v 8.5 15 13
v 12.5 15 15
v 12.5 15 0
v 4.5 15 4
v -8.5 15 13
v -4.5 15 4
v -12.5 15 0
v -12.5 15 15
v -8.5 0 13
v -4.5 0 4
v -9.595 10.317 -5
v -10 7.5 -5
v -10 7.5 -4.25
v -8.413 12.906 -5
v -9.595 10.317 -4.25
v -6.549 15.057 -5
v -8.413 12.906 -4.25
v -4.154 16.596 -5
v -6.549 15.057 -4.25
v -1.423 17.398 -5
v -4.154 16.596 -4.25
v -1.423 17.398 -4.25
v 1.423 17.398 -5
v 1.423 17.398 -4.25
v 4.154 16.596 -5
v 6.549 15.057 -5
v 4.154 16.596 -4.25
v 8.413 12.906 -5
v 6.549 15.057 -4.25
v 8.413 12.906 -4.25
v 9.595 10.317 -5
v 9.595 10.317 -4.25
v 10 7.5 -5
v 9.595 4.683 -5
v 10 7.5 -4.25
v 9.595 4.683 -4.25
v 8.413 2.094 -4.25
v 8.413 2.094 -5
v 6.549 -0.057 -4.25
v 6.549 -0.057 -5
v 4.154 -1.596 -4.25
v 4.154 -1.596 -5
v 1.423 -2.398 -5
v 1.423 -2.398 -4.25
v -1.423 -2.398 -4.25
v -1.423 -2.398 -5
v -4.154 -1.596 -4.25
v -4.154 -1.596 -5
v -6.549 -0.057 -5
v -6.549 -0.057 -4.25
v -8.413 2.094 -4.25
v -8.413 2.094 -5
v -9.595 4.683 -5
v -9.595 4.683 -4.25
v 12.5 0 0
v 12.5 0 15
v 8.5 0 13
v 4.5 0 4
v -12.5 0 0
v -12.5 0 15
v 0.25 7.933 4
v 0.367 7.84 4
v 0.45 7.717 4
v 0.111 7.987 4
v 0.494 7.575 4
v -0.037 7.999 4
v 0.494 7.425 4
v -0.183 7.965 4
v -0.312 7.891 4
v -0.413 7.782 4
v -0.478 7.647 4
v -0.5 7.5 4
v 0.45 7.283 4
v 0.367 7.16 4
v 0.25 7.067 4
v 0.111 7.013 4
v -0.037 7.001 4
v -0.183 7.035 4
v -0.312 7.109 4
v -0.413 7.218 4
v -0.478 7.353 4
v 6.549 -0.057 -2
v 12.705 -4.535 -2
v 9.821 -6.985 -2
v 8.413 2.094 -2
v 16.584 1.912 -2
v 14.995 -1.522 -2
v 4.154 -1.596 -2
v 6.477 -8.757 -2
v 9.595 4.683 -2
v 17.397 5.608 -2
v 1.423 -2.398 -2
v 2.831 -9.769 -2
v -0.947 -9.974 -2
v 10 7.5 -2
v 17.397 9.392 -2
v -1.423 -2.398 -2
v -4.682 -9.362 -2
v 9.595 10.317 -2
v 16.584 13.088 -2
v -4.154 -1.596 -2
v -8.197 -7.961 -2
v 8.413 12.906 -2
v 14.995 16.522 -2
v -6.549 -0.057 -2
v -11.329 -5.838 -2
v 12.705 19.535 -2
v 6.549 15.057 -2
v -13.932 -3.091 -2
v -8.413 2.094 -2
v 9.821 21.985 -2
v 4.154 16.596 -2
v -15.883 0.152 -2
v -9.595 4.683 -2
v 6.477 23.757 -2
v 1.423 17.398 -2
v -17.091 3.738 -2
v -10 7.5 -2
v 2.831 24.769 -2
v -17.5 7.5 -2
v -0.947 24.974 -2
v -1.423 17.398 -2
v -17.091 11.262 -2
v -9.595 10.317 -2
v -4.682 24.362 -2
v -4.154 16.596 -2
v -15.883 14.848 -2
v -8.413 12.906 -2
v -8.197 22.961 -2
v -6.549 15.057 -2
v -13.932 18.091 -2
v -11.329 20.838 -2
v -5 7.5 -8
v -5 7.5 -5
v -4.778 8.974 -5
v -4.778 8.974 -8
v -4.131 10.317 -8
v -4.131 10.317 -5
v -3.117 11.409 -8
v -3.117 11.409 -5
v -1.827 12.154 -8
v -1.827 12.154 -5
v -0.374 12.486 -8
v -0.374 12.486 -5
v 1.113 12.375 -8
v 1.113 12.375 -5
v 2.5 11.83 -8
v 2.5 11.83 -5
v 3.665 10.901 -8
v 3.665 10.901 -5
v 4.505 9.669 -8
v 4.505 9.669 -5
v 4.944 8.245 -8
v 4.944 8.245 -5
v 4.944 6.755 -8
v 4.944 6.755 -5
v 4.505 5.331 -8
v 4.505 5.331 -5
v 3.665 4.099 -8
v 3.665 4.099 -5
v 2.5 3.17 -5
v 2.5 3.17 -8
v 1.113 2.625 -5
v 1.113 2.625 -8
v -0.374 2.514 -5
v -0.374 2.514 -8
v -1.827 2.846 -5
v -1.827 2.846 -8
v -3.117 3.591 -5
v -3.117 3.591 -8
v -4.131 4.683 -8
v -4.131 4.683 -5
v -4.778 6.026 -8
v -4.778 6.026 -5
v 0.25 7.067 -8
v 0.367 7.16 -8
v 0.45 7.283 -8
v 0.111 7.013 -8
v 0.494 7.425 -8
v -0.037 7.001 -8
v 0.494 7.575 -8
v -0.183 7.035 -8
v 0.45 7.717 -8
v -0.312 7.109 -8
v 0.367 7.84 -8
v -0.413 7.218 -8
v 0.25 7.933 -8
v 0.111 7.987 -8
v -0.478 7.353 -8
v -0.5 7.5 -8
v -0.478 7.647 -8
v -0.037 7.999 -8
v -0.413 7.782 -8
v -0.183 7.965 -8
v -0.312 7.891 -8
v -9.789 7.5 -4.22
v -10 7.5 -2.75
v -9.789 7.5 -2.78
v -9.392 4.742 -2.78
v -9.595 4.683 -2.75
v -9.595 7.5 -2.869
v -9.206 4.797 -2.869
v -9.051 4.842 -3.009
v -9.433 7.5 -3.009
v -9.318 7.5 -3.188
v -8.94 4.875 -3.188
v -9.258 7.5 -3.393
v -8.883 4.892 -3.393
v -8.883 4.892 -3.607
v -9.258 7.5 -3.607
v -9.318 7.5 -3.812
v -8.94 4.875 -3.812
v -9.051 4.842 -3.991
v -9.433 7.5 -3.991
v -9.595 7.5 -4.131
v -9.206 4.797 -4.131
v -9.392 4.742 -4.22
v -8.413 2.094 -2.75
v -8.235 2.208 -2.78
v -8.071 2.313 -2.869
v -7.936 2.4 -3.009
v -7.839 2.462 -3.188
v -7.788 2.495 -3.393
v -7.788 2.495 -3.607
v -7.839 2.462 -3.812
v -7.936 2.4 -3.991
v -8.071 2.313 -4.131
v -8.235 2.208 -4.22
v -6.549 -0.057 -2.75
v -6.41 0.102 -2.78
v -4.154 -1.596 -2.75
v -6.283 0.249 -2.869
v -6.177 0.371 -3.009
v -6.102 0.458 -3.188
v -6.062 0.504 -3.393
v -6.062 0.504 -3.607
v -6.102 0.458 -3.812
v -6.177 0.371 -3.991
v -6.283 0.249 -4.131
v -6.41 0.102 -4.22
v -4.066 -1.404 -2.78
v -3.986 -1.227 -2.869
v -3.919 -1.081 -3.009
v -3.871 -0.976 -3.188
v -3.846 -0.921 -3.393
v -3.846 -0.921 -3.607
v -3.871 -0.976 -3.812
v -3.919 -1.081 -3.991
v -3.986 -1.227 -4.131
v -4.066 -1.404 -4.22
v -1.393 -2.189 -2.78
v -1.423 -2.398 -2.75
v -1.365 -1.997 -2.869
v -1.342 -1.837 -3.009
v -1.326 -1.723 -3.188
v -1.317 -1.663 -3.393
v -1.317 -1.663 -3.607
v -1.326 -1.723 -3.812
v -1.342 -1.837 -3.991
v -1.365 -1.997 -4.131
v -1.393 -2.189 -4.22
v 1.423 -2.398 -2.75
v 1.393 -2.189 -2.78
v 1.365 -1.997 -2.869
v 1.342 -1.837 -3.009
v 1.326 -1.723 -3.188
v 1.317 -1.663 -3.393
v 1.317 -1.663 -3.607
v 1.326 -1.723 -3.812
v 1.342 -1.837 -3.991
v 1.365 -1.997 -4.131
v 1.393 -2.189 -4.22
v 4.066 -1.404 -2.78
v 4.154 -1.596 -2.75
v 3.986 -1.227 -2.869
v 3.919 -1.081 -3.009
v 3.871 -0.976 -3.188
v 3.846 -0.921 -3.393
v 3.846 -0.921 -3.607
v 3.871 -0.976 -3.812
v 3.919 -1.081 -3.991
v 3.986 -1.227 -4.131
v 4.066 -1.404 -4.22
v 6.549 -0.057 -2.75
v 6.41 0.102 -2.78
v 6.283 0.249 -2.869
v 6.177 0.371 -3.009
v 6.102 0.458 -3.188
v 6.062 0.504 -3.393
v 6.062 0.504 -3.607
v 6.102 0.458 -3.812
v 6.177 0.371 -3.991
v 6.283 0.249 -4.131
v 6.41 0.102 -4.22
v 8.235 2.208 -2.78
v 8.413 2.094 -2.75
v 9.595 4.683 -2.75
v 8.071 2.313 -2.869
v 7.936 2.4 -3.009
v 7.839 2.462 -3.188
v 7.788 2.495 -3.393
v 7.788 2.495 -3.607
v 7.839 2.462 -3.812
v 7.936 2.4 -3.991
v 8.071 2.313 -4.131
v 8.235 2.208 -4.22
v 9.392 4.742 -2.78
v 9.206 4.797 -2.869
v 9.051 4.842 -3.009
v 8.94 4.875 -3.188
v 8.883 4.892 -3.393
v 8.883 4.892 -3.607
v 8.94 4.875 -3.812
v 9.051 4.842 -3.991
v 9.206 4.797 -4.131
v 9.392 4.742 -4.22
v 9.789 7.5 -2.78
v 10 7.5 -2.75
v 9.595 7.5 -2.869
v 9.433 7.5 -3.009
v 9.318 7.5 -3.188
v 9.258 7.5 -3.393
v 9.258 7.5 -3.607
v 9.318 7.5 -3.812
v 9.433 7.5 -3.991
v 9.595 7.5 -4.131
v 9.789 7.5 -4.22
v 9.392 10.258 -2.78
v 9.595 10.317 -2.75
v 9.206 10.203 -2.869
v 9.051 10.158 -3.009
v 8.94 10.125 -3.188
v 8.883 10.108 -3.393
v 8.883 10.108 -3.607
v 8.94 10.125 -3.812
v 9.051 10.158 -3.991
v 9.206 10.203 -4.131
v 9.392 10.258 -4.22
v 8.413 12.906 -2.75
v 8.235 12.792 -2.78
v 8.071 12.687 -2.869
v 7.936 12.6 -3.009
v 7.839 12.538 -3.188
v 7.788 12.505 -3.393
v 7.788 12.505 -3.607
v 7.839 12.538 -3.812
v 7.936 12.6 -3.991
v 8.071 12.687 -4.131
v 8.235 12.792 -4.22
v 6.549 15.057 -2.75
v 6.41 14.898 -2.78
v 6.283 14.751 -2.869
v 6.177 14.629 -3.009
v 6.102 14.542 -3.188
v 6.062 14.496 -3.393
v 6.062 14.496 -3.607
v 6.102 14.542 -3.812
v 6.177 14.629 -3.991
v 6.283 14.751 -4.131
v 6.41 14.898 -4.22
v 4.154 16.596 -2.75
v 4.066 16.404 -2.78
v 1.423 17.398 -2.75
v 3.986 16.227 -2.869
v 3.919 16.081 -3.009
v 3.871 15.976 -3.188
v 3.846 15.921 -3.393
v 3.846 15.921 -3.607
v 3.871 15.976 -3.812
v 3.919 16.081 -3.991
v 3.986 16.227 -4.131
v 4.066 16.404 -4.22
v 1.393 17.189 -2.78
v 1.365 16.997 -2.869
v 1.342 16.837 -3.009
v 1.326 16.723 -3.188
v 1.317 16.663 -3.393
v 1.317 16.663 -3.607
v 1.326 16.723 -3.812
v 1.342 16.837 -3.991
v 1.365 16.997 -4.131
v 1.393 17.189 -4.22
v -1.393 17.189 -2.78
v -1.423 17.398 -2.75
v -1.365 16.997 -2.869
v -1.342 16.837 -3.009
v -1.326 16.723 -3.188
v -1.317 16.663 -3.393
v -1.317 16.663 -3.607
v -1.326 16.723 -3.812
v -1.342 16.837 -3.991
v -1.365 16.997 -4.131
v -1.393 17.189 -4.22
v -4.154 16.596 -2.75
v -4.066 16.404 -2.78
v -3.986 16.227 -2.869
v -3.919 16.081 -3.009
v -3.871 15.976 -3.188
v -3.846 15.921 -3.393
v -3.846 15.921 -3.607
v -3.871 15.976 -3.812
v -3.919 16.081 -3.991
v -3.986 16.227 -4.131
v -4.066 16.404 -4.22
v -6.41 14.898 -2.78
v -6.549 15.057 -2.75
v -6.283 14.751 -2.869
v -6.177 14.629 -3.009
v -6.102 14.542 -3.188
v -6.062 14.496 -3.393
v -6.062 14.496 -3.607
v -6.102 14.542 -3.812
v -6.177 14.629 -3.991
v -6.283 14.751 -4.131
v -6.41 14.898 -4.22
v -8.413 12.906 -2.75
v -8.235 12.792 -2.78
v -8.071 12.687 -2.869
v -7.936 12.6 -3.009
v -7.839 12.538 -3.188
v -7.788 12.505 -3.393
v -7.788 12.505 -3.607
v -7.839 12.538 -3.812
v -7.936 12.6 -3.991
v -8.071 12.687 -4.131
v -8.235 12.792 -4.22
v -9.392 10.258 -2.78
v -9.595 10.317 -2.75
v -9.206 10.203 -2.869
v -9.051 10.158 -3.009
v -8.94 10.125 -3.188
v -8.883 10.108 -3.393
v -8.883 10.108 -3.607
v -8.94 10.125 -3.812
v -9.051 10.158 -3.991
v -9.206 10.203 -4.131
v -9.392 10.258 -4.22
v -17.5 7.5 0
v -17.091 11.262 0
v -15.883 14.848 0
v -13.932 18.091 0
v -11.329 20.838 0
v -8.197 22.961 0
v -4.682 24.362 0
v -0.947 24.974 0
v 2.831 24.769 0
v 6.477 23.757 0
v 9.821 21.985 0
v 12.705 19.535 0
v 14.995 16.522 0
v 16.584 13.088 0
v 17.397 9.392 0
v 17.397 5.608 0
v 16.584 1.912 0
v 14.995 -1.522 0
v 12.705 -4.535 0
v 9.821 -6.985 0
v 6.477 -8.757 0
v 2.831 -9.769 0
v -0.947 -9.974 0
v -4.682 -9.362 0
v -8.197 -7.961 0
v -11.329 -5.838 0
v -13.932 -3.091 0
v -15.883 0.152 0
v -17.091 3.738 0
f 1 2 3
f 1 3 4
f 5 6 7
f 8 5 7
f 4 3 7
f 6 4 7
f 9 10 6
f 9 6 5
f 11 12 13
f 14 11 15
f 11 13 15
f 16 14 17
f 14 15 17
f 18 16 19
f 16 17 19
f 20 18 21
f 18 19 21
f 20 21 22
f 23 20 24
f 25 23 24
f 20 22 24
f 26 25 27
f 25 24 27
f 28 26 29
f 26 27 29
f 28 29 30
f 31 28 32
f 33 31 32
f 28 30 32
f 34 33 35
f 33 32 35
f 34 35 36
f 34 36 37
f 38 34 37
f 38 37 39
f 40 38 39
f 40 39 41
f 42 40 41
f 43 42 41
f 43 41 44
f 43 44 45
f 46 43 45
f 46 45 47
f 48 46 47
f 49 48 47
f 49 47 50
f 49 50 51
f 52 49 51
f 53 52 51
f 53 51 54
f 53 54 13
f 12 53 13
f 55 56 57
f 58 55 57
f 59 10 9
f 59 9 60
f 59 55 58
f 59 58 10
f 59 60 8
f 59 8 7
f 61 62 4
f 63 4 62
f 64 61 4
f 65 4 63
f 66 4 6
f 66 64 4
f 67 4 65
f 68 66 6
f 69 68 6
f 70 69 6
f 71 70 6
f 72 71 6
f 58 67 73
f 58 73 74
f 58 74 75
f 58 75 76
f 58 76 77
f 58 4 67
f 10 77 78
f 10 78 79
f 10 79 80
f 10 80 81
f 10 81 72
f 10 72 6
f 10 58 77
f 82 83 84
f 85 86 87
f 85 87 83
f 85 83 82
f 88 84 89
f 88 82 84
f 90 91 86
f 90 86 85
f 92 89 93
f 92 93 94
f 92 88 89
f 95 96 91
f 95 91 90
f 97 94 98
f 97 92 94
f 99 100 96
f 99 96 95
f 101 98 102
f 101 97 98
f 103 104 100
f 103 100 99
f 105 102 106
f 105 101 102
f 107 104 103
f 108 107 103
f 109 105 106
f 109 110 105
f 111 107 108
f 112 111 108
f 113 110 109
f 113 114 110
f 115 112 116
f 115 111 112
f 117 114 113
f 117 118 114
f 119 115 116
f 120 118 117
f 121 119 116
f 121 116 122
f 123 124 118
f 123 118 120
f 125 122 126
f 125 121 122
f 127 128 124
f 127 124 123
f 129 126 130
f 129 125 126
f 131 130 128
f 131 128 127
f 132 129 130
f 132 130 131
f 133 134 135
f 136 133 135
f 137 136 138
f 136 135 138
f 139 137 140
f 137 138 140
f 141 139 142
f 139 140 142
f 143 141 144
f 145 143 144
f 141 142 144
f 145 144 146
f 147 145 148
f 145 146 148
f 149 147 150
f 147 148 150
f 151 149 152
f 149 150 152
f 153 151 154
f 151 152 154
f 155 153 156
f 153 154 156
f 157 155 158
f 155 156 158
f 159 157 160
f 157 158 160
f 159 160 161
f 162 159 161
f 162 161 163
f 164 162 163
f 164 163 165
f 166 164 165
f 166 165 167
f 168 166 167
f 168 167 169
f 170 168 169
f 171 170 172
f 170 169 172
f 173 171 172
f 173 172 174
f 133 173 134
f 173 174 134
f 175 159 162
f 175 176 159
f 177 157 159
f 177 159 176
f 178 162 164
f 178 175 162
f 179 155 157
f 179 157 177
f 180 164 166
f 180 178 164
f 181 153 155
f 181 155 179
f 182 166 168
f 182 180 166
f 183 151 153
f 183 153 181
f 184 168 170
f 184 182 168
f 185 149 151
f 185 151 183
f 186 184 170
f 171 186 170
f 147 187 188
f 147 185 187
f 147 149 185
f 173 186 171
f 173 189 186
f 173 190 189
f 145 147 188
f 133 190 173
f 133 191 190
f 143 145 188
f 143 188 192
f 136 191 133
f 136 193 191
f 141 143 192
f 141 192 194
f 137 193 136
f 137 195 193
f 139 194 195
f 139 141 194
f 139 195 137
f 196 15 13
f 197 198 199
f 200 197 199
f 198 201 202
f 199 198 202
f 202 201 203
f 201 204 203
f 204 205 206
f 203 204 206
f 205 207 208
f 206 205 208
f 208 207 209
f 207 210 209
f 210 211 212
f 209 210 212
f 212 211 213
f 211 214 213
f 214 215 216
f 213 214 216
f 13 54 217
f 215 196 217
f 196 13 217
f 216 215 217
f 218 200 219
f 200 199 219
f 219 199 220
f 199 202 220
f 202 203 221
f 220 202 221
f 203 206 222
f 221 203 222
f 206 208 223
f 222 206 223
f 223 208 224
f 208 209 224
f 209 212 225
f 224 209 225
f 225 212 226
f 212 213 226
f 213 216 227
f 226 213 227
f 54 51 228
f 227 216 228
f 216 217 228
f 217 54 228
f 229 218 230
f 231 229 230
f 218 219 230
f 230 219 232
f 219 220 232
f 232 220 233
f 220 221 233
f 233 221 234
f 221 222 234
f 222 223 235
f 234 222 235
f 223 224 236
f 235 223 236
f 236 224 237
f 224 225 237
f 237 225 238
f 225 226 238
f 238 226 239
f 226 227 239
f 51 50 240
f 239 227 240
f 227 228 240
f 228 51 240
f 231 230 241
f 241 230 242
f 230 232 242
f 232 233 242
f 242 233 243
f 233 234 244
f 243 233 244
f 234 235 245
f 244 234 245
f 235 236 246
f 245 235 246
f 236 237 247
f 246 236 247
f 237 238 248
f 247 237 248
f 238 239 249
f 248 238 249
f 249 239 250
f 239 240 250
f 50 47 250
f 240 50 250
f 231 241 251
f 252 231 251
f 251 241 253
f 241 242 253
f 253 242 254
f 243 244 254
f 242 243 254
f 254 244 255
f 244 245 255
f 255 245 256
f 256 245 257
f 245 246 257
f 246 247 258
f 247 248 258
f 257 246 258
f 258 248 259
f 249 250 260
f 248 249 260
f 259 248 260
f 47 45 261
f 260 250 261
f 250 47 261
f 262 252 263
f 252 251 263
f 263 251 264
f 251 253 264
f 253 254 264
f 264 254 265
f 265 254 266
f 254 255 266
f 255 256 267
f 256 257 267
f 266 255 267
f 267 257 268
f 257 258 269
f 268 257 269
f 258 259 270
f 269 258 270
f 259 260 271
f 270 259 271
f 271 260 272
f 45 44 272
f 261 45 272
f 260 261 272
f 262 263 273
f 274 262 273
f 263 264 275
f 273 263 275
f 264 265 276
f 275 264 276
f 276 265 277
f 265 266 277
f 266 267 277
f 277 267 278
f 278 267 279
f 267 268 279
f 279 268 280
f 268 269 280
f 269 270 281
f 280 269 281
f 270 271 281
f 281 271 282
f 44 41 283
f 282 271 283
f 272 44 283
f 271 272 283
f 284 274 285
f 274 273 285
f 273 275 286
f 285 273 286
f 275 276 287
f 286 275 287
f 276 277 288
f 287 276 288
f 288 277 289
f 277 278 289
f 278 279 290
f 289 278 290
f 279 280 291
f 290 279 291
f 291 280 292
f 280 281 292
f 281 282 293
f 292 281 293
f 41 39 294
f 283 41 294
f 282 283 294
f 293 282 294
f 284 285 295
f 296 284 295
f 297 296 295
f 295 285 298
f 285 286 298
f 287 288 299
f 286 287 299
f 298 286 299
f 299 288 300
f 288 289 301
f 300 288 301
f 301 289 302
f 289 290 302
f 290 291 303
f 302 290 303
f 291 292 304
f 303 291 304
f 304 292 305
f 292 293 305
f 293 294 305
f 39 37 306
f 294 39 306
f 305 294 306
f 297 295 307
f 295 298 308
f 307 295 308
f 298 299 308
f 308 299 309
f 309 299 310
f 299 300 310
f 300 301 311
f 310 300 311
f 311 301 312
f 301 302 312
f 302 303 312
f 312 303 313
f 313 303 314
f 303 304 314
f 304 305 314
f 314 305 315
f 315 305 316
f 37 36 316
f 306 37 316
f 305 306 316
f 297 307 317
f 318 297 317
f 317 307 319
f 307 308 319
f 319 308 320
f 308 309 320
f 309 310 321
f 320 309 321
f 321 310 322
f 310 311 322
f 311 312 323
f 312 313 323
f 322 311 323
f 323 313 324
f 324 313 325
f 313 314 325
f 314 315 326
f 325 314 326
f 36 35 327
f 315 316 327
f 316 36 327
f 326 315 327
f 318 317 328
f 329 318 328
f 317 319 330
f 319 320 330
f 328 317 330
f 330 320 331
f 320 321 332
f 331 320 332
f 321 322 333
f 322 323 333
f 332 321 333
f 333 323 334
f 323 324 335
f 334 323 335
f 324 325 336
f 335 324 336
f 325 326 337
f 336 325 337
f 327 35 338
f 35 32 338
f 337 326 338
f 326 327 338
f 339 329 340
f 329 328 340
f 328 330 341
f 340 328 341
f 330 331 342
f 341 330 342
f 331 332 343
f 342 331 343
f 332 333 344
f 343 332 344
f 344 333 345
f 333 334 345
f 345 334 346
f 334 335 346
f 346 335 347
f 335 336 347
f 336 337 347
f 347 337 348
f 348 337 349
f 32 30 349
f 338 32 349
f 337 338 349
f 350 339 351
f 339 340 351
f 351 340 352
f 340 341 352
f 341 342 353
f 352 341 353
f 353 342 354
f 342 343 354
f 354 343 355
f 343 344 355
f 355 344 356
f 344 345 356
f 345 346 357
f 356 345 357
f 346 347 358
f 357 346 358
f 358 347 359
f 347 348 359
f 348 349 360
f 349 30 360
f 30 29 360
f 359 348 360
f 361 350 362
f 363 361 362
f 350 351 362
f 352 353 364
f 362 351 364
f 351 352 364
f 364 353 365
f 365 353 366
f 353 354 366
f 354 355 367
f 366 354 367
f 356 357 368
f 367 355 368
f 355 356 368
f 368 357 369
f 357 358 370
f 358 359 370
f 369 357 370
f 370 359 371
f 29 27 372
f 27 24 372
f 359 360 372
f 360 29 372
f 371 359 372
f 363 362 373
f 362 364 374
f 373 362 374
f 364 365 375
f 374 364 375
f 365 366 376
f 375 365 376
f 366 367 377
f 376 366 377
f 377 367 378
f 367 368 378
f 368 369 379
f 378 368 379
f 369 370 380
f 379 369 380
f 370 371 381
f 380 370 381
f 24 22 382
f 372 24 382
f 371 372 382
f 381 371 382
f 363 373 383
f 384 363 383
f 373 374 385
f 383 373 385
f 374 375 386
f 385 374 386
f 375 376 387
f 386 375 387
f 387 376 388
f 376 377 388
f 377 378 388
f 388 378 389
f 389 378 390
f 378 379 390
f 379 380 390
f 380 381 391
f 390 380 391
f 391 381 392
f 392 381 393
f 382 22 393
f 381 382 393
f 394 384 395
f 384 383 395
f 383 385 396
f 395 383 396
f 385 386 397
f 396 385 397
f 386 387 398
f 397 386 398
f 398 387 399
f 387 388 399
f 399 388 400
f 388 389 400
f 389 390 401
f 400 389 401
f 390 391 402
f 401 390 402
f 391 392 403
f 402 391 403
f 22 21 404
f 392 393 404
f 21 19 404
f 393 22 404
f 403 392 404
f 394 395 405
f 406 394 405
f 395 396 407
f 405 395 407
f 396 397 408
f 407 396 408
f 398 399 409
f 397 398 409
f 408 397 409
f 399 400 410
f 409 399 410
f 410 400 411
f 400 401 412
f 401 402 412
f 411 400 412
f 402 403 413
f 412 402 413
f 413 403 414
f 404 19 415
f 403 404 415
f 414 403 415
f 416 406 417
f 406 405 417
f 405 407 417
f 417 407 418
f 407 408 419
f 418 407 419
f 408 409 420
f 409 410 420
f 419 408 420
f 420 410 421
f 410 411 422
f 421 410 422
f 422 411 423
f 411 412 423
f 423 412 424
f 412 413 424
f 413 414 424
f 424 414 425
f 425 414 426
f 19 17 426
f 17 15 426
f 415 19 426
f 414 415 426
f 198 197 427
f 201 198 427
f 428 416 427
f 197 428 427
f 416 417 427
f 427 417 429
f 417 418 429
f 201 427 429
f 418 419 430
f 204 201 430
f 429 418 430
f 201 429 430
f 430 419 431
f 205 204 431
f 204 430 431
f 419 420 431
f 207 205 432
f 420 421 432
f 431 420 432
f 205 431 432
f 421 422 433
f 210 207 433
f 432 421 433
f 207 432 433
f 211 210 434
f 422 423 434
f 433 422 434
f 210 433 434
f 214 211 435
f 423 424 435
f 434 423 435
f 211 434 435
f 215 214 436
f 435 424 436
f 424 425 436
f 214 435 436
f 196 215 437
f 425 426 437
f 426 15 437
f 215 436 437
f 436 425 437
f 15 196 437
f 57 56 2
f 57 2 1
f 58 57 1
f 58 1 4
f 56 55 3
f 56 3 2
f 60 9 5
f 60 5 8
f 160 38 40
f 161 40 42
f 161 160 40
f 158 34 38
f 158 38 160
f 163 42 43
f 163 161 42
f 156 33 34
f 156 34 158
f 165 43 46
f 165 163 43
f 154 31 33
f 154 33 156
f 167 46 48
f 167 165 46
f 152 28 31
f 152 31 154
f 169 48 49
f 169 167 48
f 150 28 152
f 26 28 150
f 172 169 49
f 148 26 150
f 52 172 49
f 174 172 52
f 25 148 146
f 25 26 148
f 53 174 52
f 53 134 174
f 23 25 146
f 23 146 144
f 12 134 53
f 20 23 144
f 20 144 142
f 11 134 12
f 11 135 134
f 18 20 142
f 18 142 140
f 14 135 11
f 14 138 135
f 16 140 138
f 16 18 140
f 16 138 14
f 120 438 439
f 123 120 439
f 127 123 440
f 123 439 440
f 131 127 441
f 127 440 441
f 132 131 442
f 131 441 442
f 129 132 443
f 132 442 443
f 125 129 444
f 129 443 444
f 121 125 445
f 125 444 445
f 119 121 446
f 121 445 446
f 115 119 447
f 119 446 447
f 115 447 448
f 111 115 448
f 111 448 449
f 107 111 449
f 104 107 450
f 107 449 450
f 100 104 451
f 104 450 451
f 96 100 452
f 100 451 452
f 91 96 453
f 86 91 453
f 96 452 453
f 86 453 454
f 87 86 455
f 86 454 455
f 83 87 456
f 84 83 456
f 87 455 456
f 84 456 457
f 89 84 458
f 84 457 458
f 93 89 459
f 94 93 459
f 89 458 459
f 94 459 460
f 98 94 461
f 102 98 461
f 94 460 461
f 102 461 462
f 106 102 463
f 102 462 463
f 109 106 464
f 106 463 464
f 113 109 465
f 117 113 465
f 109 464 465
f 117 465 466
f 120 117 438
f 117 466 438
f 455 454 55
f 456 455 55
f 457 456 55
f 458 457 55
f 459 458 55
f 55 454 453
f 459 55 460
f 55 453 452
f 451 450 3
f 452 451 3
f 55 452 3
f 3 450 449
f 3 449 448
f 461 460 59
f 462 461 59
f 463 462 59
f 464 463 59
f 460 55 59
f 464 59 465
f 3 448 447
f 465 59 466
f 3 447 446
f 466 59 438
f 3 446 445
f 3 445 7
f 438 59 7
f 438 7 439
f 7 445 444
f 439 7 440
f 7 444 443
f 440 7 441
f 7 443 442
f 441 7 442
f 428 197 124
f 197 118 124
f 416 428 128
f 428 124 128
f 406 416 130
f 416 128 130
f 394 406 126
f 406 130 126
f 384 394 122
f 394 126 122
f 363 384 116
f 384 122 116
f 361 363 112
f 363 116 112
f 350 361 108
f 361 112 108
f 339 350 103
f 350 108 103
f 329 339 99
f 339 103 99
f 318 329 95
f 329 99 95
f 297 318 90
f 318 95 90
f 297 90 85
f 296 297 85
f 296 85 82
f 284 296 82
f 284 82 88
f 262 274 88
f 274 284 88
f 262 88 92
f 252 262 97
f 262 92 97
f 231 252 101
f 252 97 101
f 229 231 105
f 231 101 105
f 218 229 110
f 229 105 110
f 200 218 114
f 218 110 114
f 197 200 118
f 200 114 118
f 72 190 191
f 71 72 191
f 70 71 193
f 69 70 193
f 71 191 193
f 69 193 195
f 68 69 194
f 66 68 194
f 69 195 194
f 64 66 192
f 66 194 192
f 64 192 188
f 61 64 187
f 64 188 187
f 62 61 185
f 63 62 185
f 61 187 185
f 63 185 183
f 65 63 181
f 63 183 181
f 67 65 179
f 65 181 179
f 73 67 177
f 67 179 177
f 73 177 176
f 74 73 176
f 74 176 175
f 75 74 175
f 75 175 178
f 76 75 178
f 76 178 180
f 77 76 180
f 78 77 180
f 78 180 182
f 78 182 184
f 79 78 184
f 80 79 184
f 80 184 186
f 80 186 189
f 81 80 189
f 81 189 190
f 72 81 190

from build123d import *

# Parameters (mm, degrees)
SALIENTE_EXTRUIR1_DEPTH = 15
CROQUIS3_R              = 17.5
SALIENTE_EXTRUIR2_DEPTH = 2
CROQUIS4_R              = 10
SALIENTE_EXTRUIR3_DEPTH = 3
CROQUIS6_R              = 0.75
CROQUIS7_R              = 5
SALIENTE_EXTRUIR4_DEPTH = 3
CROQUIS8_R              = 0.5
CORTAR_EXTRUIR2_DEPTH   = 39.213217609


with BuildPart() as part:
    # Croquis1 → Saliente-Extruir1 (new body)
    with BuildSketch(Plane(origin=(0, 0, 0), x_dir=(1, 0, 0), z_dir=(0, 1, 0))):
        Polygon((8.5, -13), (4.5, -4), (-4.5, -4), (-8.5, -13), (-12.5, -15), (-12.5, 0), (12.5, 0), (12.5, -15), align=None)
    extrude(amount=SALIENTE_EXTRUIR1_DEPTH)

    # Croquis3 → Saliente-Extruir2 (add)
    with BuildSketch(Plane(origin=(0, 0, 0), x_dir=(-1, 0, 0), z_dir=(0, 0, -1))):
        with Locations((0, 7.5)):
            Circle(CROQUIS3_R)
    extrude(amount=SALIENTE_EXTRUIR2_DEPTH)

    # Croquis4 → Saliente-Extruir3 (add)
    with BuildSketch(Plane(origin=(0, 0, -2), x_dir=(-1, 0, 0), z_dir=(0, 0, -1))):
        with Locations((0, 7.5)):
            Circle(CROQUIS4_R)
    extrude(amount=SALIENTE_EXTRUIR3_DEPTH)

    # Croquis6 → Cortar-Revolución1 (revolve, cut)
    with BuildSketch(Plane(origin=(0, 0, 0), x_dir=(0, 0, -1), z_dir=(1, 0, 0)), mode=Mode.PRIVATE) as cortar_revoluci_n1_sk:
        with Locations((3.5, 17.5)):
            Circle(CROQUIS6_R)
    revolve(cortar_revoluci_n1_sk.sketch.rotate(Axis((0, 7.5, -5), (0, 0, 1)), 90), axis=Axis((0, 7.5, -5), (0, 0, 1)), mode=Mode.SUBTRACT)

    # Croquis7 → Saliente-Extruir4 (add)
    with BuildSketch(Plane(origin=(0, 0, -5), x_dir=(-1, 0, 0), z_dir=(0, 0, -1))):
        with Locations((0, 7.5)):
            Circle(CROQUIS7_R)
    extrude(amount=SALIENTE_EXTRUIR4_DEPTH)

    # Croquis8 → Cortar-Extruir2 (cut, through all)
    with BuildSketch(Plane(origin=(0, 0, -8), x_dir=(-1, 0, 0), z_dir=(0, 0, -1))):
        with Locations((0, 7.5)):
            Circle(CROQUIS8_R)
    extrude(amount=-CORTAR_EXTRUIR2_DEPTH, mode=Mode.SUBTRACT)


solid = part.part
